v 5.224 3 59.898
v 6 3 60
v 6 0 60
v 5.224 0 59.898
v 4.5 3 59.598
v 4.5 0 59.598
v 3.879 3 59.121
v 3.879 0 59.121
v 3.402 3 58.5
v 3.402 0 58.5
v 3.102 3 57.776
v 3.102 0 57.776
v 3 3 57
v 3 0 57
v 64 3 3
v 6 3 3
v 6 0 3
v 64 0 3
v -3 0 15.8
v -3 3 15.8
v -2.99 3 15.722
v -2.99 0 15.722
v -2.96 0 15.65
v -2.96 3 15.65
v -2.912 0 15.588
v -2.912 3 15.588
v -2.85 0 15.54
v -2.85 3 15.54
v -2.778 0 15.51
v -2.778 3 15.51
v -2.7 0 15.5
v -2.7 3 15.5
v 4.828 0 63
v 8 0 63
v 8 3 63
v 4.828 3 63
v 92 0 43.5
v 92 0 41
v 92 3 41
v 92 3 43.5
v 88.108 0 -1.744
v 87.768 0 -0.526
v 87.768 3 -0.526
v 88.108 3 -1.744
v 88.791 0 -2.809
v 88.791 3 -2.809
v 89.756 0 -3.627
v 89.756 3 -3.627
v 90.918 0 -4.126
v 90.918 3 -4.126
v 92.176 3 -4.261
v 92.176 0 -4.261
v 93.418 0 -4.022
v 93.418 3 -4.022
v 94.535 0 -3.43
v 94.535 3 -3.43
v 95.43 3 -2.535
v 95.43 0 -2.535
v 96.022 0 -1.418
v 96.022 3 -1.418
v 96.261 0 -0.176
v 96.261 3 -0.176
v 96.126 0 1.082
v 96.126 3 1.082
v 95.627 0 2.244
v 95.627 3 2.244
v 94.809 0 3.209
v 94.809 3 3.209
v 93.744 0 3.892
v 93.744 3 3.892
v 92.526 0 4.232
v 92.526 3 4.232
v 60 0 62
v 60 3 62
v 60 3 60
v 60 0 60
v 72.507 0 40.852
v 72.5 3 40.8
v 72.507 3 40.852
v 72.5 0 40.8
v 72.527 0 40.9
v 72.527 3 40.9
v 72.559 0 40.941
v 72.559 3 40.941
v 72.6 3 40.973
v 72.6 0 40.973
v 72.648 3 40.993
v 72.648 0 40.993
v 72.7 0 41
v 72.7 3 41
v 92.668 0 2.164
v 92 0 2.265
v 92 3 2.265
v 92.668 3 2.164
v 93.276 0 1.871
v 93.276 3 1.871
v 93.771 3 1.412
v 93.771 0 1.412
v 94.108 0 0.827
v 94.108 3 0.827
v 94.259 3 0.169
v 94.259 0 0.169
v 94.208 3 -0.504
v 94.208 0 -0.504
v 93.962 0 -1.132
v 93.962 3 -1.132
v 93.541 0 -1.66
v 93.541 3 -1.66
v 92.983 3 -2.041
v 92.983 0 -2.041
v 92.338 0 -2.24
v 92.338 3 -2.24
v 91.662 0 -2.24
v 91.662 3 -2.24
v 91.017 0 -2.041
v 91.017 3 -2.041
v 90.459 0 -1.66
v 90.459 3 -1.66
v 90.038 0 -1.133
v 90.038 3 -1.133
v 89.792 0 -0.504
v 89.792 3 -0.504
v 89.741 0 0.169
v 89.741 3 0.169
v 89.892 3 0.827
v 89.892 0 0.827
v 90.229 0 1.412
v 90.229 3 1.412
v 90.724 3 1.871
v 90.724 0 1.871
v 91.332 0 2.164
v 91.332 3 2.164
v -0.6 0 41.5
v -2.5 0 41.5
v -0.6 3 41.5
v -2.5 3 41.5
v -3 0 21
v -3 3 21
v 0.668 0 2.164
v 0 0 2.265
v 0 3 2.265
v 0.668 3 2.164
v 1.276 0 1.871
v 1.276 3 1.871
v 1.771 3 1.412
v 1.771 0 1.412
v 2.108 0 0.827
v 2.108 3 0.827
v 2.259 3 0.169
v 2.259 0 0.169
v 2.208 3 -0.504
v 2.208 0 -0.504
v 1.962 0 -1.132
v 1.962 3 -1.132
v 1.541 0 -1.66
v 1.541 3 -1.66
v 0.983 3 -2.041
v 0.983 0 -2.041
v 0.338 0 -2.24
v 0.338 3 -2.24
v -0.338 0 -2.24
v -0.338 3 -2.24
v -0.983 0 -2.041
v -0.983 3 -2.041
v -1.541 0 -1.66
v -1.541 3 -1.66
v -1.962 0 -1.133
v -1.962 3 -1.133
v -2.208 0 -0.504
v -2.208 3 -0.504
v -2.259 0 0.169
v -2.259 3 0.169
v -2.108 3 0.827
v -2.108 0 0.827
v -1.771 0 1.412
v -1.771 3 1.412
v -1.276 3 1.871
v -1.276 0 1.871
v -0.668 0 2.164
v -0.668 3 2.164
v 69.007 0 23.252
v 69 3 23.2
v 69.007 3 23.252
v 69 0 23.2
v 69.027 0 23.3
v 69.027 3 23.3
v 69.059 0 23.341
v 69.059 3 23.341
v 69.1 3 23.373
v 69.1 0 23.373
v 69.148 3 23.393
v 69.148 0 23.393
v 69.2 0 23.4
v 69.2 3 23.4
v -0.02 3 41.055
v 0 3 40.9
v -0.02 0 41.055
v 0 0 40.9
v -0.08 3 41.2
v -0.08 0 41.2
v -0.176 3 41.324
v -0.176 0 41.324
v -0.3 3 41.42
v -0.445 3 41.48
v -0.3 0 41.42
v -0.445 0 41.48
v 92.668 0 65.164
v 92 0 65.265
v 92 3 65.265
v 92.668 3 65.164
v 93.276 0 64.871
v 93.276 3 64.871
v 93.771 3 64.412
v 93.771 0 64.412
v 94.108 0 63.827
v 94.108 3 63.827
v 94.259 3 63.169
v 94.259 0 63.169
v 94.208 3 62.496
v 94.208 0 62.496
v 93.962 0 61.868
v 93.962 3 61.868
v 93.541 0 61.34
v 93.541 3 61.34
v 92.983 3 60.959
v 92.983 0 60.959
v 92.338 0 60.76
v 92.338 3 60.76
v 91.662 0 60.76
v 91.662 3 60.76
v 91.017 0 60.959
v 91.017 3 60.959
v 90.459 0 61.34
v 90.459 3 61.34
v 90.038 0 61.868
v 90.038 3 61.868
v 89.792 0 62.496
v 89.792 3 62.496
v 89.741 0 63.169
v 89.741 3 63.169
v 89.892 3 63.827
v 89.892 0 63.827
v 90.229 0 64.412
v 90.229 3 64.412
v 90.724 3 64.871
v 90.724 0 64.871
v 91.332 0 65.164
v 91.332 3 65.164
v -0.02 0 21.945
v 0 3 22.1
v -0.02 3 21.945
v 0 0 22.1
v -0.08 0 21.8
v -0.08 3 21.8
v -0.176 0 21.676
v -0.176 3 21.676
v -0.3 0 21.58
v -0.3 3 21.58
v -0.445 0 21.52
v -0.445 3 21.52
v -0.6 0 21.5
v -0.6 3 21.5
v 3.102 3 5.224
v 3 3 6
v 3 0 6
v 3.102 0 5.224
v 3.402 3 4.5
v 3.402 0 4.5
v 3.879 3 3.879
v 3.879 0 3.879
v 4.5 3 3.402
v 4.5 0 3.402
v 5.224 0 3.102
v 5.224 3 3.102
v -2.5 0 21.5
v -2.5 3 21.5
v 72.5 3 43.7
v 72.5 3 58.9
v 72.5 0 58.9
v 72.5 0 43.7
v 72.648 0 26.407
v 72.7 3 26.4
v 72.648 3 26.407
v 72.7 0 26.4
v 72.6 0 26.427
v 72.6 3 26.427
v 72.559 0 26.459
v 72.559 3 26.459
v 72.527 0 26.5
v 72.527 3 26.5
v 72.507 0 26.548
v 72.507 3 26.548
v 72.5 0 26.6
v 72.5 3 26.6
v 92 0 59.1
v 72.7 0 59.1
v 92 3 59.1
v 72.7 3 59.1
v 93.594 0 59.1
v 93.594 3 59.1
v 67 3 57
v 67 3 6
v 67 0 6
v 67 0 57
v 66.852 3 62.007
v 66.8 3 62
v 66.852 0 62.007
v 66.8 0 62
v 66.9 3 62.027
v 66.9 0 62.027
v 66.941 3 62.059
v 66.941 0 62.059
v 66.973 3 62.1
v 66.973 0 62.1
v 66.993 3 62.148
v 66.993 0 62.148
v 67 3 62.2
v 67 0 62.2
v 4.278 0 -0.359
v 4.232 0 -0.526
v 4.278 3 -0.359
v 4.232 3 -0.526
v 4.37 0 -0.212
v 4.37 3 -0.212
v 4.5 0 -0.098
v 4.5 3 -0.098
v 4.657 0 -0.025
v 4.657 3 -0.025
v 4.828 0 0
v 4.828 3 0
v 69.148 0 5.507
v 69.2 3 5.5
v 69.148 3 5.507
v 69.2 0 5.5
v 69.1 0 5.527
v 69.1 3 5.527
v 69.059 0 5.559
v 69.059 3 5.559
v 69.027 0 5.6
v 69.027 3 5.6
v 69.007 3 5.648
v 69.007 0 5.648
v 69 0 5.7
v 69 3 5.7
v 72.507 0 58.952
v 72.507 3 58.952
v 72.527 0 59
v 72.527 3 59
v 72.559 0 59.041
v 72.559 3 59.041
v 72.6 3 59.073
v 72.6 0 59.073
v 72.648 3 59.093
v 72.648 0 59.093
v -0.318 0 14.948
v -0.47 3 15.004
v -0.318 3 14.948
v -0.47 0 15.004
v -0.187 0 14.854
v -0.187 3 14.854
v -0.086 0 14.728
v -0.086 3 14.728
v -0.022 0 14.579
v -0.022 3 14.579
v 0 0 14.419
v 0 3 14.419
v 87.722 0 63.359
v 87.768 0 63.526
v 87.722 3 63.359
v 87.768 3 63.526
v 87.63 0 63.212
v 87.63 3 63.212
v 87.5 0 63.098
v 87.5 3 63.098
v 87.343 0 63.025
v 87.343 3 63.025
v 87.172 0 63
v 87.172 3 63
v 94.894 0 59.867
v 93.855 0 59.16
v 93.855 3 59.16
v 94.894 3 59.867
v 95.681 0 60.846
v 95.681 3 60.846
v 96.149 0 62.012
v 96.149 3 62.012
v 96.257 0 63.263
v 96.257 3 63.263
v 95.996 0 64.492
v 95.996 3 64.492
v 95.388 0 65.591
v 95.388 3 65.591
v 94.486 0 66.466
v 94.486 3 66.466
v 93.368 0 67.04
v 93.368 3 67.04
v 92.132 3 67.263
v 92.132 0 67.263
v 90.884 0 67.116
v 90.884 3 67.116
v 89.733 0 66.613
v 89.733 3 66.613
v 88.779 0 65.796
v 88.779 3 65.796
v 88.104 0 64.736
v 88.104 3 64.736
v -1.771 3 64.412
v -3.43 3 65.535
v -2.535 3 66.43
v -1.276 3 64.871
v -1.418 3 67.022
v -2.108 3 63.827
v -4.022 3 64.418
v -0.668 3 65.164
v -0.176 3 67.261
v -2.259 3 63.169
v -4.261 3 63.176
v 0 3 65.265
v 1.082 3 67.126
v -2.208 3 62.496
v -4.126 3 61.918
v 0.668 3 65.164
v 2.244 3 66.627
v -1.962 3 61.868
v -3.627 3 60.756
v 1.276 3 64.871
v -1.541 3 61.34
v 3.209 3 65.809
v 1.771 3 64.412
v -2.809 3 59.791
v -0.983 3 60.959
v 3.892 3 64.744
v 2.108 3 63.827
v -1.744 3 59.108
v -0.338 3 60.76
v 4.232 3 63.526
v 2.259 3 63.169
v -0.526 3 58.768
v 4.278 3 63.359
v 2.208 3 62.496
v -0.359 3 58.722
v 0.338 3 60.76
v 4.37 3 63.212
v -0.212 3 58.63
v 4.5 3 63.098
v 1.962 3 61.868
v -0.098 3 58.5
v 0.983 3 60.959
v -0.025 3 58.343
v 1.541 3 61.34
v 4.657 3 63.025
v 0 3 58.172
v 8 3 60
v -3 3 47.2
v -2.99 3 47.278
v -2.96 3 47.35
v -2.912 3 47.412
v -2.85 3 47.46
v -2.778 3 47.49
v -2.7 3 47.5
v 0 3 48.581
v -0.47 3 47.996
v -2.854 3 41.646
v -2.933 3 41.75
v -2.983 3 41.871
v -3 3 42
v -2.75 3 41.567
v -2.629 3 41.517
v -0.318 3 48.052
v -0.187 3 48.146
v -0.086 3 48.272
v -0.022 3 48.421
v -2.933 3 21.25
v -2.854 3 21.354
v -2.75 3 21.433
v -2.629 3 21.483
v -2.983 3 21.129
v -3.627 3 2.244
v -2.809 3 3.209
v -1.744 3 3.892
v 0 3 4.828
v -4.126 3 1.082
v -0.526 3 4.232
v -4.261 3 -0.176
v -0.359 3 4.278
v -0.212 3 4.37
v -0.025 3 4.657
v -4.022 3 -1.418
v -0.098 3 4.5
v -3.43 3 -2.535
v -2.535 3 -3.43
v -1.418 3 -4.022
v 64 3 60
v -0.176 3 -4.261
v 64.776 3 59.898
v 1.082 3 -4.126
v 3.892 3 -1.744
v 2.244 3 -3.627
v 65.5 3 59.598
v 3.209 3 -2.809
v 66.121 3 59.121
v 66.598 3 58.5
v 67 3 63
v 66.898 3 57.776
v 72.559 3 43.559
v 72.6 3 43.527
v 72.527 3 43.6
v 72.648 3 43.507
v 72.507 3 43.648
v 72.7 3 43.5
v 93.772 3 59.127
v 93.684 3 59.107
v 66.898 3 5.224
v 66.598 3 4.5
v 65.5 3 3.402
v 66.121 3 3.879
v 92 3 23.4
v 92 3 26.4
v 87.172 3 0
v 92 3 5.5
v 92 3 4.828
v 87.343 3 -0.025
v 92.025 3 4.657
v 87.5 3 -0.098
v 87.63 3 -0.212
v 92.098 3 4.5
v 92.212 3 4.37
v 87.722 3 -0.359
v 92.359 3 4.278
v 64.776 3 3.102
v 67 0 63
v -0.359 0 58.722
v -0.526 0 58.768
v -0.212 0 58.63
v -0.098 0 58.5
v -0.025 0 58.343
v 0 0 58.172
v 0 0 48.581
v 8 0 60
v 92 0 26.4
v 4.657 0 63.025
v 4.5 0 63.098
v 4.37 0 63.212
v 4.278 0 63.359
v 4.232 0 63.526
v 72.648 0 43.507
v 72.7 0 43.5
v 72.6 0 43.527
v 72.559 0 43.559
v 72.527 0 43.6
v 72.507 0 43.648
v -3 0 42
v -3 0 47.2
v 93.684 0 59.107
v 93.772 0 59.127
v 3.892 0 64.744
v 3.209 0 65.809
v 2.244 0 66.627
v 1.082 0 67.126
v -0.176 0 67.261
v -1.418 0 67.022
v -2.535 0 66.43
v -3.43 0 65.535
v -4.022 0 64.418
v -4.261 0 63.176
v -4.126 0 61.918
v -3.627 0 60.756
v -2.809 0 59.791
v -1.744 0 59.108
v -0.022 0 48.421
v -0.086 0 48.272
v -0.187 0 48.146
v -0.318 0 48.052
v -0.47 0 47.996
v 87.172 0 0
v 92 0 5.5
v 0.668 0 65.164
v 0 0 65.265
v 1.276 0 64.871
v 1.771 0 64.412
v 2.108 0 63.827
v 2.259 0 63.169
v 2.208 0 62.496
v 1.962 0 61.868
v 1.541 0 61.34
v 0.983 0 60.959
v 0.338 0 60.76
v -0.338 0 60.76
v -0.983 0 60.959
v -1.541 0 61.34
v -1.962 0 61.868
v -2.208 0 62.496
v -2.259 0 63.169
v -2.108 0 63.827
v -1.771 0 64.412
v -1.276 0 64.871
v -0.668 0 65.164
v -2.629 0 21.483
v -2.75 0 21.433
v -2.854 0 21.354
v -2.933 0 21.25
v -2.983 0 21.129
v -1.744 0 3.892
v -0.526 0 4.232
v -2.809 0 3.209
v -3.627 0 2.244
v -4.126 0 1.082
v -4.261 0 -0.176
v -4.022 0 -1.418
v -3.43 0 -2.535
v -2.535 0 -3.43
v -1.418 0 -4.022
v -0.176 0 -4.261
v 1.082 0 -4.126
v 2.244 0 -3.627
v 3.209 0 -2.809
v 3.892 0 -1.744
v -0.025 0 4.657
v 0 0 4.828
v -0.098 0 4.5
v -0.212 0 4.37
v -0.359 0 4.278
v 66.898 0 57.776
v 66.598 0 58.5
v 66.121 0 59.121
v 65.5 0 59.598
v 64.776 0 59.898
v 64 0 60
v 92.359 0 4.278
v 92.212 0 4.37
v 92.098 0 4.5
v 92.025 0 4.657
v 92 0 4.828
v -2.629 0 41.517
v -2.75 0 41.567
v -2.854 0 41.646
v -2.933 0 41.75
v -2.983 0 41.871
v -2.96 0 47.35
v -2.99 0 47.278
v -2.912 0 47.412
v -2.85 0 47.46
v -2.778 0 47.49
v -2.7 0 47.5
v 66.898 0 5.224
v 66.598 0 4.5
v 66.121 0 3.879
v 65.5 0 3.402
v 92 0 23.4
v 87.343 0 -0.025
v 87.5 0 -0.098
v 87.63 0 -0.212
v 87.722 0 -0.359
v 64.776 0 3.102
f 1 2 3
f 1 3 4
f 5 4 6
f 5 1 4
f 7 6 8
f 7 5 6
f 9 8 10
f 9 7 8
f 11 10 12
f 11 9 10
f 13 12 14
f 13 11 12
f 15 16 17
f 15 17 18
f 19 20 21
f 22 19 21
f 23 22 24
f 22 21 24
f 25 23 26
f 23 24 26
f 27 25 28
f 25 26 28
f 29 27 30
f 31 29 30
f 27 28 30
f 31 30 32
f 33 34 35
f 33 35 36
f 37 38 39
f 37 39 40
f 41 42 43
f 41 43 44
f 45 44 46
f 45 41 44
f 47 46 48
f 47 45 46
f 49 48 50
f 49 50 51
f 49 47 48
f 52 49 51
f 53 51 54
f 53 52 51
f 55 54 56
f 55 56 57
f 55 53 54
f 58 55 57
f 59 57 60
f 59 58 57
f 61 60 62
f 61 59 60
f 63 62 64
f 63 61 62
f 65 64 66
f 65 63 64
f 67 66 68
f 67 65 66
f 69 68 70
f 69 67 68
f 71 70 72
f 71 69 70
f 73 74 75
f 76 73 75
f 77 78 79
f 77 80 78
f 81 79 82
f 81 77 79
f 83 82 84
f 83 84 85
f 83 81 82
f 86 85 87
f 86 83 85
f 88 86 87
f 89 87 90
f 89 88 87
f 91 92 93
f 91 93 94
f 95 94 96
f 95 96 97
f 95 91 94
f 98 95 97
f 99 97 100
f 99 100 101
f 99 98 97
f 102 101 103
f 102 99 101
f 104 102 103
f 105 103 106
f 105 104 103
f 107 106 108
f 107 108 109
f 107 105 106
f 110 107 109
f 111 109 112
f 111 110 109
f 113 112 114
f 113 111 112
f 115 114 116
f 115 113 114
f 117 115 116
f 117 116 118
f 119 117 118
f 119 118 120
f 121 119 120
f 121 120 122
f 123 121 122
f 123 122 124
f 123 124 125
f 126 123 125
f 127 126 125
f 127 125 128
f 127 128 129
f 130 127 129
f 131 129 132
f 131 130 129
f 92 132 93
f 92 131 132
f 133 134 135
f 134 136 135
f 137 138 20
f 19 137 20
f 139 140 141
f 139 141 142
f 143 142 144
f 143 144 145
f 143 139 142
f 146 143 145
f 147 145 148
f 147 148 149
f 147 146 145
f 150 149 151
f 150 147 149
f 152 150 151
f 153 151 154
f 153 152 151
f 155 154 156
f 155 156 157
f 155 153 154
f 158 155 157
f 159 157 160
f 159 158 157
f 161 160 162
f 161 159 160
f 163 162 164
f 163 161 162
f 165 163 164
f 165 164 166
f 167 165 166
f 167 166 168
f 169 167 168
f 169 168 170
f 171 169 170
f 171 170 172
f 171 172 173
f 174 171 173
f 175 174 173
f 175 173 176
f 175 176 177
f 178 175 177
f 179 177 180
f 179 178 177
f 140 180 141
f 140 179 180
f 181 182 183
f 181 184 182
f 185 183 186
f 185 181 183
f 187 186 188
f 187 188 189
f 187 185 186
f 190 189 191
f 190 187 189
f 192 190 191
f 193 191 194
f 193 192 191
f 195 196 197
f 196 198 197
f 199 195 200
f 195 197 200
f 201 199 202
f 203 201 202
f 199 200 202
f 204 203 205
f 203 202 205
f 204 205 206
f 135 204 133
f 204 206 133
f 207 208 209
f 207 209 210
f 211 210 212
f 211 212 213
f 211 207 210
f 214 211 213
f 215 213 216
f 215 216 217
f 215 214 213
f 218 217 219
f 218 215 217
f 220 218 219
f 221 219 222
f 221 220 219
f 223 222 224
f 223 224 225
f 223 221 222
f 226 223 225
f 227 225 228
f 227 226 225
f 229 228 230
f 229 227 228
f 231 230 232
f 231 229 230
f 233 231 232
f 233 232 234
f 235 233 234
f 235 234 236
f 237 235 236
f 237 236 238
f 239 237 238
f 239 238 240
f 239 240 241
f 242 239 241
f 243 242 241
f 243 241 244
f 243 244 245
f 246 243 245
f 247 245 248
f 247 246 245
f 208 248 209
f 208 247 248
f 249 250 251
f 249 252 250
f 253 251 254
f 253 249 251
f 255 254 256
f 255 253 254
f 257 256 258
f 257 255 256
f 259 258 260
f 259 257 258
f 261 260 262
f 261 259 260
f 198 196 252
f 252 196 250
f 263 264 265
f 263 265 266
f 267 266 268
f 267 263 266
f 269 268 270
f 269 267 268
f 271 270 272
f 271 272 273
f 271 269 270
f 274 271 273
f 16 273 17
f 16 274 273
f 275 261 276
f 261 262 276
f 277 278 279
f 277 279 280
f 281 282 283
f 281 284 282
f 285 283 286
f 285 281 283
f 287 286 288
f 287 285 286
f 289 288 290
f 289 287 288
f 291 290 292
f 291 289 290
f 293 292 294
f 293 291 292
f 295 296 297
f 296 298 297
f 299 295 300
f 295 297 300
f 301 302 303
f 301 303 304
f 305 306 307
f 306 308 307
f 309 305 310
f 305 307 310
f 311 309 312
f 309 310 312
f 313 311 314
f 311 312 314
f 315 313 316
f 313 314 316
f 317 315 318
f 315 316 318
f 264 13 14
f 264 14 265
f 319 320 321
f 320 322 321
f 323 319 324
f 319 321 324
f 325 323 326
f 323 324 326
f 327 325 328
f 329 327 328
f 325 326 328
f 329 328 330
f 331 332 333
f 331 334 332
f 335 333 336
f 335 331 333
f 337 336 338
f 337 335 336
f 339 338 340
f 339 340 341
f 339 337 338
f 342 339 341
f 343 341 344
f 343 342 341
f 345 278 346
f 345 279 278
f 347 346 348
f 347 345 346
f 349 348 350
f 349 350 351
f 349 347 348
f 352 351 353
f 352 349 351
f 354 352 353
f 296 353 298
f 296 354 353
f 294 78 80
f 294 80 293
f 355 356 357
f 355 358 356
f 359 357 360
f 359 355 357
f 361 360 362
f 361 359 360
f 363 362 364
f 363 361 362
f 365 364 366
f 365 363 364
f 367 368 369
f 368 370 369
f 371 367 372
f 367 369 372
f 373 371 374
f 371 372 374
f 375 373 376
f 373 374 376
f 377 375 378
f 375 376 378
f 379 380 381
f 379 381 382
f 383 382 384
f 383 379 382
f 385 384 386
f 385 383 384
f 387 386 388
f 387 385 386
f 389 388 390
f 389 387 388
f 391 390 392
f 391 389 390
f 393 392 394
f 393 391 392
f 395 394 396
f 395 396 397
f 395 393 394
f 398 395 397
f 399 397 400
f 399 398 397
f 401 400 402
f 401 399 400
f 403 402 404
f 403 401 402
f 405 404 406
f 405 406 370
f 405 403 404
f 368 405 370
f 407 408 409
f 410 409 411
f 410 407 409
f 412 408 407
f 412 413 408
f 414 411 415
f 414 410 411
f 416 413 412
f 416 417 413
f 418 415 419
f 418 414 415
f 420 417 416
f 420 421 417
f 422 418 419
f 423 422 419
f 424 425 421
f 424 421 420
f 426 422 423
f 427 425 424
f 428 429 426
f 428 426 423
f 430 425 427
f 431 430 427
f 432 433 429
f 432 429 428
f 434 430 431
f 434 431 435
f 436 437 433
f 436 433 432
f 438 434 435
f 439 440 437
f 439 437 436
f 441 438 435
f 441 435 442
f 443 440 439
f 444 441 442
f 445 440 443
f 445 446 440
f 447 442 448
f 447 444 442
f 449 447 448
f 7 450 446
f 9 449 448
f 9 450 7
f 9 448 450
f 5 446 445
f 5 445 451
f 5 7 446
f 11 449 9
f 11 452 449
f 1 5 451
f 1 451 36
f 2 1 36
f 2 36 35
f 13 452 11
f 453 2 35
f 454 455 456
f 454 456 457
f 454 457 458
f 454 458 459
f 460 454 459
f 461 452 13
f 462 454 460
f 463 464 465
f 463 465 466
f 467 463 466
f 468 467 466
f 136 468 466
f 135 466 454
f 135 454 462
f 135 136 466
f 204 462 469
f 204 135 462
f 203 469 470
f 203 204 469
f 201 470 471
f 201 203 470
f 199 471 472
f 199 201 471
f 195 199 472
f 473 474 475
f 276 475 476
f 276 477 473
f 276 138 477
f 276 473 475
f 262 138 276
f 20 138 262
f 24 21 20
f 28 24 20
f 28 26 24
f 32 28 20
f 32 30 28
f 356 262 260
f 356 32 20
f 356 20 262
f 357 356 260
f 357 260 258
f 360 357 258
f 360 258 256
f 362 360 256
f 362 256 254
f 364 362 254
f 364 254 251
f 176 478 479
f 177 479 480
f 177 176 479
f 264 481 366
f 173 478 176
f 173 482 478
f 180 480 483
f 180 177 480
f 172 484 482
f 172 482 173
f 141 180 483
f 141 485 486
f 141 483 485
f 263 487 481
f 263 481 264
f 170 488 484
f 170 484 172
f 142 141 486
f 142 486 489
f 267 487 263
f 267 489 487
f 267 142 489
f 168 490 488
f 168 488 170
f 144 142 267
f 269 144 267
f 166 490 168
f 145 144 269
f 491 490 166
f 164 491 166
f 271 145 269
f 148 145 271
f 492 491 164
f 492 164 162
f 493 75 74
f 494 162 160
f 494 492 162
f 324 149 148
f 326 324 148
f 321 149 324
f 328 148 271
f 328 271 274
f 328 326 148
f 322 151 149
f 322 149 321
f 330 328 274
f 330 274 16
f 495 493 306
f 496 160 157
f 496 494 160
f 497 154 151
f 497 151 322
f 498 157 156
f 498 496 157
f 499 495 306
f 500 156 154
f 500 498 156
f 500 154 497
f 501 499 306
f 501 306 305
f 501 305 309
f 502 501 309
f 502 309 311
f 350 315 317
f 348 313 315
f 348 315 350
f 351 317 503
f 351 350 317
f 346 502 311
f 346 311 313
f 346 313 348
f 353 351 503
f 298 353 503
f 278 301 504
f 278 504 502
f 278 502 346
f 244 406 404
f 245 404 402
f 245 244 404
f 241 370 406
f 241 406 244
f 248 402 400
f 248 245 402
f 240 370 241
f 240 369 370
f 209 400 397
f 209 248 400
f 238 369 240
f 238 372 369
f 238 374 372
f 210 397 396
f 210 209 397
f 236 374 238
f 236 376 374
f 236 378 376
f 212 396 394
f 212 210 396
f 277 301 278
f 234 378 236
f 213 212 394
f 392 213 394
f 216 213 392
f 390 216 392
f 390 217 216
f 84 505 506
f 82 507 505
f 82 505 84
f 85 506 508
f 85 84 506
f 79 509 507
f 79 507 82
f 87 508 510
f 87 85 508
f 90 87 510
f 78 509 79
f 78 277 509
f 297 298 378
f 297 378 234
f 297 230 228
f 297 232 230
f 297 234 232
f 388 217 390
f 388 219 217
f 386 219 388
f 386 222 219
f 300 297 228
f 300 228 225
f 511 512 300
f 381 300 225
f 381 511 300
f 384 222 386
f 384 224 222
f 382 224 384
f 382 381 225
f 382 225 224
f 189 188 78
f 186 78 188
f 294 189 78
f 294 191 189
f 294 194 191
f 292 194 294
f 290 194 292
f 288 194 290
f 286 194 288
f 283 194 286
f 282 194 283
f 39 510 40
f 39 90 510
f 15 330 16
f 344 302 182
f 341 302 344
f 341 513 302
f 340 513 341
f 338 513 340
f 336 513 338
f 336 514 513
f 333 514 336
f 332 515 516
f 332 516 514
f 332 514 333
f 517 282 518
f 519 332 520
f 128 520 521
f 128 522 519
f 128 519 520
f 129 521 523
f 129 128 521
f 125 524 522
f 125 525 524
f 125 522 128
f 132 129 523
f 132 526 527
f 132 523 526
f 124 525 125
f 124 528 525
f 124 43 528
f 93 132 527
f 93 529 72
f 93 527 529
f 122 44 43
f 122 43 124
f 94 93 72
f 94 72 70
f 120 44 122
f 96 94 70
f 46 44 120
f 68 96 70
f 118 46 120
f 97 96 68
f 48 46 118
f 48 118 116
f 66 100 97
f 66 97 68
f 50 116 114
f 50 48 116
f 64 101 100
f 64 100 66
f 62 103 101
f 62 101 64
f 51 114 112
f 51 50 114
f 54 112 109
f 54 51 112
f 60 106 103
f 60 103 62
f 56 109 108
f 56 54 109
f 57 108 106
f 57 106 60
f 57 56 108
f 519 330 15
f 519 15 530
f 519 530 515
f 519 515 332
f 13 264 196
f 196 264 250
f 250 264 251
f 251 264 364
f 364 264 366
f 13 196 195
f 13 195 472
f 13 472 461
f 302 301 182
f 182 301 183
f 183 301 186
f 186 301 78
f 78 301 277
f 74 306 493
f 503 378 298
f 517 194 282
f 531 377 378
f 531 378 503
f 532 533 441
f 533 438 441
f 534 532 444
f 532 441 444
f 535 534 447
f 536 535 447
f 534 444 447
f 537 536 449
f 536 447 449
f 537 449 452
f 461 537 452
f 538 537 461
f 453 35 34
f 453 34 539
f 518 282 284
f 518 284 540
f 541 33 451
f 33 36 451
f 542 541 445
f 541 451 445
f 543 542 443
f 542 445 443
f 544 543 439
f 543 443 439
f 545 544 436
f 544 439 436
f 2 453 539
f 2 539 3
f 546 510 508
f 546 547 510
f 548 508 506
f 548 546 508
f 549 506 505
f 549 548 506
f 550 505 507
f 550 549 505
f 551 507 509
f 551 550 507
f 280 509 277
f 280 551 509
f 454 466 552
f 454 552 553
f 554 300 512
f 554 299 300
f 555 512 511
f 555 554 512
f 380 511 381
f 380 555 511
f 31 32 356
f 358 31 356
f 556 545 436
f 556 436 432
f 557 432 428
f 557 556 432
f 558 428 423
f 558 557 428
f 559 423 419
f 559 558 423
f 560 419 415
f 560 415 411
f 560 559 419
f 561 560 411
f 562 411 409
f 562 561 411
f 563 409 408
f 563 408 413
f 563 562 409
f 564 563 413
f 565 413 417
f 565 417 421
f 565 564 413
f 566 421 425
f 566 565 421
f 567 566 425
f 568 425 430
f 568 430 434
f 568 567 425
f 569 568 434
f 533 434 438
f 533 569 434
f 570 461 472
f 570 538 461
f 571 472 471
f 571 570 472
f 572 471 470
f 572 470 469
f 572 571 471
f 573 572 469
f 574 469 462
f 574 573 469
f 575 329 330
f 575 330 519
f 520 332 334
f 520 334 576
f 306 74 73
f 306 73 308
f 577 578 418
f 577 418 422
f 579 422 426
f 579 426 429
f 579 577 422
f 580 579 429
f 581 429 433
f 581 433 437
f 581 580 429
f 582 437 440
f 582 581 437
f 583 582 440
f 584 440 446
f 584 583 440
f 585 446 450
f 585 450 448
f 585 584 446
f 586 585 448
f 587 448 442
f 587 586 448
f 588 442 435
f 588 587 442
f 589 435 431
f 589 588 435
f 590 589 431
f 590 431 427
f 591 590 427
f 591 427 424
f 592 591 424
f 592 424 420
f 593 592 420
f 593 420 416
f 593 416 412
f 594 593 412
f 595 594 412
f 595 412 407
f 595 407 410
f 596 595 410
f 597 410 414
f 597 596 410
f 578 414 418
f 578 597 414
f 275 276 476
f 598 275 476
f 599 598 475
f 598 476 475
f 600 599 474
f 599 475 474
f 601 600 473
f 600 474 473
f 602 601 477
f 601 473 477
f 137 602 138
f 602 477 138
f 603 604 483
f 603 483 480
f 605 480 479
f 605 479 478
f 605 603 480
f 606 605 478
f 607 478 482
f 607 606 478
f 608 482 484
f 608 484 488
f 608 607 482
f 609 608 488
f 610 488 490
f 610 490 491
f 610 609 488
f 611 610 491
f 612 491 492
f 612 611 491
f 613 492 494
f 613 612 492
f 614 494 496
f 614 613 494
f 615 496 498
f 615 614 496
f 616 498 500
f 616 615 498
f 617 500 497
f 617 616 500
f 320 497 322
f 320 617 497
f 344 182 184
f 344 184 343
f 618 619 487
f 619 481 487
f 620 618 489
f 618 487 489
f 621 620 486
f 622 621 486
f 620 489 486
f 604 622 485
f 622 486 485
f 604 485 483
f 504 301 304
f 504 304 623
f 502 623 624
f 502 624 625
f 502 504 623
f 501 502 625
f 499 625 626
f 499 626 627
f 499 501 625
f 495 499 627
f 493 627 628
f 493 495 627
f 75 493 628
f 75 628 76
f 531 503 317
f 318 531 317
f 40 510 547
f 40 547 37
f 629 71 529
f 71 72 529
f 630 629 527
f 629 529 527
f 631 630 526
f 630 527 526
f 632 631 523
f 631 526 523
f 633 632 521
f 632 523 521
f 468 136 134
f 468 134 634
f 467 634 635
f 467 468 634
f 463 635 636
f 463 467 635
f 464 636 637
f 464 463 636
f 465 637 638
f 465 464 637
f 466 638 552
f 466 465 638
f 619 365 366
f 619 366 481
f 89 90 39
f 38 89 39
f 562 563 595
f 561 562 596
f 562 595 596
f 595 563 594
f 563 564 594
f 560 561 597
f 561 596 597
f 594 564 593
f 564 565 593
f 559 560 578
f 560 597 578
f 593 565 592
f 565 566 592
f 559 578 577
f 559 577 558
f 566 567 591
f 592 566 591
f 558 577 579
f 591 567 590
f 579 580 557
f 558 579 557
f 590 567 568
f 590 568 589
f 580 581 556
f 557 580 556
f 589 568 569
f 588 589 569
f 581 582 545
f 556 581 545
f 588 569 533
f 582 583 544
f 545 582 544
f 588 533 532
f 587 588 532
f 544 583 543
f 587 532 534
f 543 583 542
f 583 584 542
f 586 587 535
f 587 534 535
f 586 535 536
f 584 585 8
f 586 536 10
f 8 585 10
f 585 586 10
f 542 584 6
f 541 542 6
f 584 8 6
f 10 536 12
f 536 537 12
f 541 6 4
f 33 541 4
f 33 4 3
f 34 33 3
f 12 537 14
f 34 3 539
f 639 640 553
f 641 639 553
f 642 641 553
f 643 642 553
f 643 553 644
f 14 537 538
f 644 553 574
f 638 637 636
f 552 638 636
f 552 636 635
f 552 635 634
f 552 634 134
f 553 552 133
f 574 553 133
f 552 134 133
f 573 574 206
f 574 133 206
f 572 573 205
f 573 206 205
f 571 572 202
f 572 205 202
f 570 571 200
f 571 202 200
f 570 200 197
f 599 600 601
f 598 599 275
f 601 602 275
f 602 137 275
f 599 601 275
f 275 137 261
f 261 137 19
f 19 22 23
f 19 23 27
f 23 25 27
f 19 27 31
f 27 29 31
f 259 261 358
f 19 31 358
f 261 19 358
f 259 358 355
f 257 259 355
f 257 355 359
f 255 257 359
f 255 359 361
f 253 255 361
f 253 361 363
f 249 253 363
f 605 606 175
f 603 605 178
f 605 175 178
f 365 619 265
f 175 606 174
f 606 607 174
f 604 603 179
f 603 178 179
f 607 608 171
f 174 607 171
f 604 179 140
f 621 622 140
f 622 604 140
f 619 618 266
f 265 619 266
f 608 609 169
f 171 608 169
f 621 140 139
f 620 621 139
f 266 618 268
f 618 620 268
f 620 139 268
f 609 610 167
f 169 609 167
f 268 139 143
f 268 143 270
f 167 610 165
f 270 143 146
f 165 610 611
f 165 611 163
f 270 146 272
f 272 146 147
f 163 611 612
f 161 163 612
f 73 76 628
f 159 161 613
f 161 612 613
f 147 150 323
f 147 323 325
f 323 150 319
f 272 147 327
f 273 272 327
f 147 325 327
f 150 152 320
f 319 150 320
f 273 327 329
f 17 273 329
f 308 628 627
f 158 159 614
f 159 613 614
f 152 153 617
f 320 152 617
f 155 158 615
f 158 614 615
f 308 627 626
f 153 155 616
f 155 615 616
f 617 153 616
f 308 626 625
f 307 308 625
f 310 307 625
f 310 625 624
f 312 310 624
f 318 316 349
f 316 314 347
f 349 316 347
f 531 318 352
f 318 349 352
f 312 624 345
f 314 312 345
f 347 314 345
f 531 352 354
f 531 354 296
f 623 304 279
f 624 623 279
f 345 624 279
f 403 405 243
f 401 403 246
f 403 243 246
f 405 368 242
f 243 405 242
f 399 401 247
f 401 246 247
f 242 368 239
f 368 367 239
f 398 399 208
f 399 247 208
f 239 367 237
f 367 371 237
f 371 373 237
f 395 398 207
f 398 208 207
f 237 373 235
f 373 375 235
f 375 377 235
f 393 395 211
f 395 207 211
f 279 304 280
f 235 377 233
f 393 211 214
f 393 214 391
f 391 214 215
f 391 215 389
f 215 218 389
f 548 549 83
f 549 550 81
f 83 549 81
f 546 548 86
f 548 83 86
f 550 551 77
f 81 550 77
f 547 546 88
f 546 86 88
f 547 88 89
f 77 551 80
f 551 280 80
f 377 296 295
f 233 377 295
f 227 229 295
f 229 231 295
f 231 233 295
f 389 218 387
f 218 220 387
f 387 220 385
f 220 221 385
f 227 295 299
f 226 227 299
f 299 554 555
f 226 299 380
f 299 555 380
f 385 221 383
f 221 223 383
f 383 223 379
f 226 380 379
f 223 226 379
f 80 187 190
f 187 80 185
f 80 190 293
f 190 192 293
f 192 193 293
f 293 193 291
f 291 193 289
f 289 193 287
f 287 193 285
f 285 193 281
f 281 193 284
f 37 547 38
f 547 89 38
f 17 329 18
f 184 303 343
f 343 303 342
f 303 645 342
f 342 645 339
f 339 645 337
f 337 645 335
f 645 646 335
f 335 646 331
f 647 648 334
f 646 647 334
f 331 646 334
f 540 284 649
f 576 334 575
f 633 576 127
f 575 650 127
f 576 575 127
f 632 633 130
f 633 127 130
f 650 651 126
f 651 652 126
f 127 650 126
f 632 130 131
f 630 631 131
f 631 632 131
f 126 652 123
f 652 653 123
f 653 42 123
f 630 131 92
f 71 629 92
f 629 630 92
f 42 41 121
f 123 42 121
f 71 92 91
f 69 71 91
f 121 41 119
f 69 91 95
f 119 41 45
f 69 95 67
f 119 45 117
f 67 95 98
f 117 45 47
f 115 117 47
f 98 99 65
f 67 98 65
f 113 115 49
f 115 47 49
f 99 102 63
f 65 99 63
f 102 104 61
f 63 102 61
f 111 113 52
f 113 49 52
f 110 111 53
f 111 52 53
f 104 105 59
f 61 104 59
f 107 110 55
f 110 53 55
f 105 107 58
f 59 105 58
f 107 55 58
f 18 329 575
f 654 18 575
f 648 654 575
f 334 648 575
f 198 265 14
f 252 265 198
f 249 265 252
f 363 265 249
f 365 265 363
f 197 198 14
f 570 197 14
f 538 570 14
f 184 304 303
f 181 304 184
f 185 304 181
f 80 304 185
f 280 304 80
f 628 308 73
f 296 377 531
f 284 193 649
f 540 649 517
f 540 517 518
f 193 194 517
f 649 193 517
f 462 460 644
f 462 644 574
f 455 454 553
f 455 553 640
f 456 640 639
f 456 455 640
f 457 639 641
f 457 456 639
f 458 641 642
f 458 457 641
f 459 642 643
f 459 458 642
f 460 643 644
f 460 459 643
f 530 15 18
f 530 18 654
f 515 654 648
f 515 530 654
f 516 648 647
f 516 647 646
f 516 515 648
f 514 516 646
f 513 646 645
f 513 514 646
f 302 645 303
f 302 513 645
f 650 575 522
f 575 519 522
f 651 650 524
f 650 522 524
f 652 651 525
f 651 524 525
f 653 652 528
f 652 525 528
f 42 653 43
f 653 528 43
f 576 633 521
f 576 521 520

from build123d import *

# Parameters (mm, degrees)
SKETCH1_R           = 2.265
BOSS_EXTRUDE1_DEPTH = 3
SKETCH2_W           = 6.5
SKETCH2_H           = 20
CUT_EXTRUDE1_DEPTH  = 3
BOSS_EXTRUDE2_DEPTH = 3
CUT_EXTRUDE2_DEPTH  = 3
SKETCH5_W           = 3
SKETCH5_H           = 20
BOSS_EXTRUDE3_DEPTH = 3
SKETCH6_W           = 27.010134686
SKETCH6_H           = 17.9
CUT_EXTRUDE3_DEPTH  = 3
SKETCH7_W           = 19.5
SKETCH7_H           = 14.6
CUT_EXTRUDE4_DEPTH  = 3
SKETCH8_W           = 19.5
SKETCH8_H           = 15.6
CUT_EXTRUDE5_DEPTH  = 3
SKETCH9_W           = 2.019620965
SKETCH9_H           = 0.574286347
CUT_EXTRUDE6_DEPTH  = 3
SKETCH10_W          = 52
SKETCH10_H          = 3
CUT_EXTRUDE7_DEPTH  = 3
SKETCH11_W          = 7
SKETCH11_H          = 1
CUT_EXTRUDE8_DEPTH  = 3
FILLET1_R           = 0.6
FILLET2_R           = 0.2


with BuildPart() as part:
    # Sketch1 → Boss-Extrude1 (new body)
    with BuildSketch(Plane(origin=(0, 0, 0), x_dir=(1, 0, 0), z_dir=(0, 1, 0))):
        with BuildLine():
            Line((4.265, 0), (87.735, 0))
            ThreePointArc((87.735, 0), (95.015810422, 3.015810422), (92, -4.265))
            Line((92, -4.265), (92, -58.735))
            ThreePointArc((92, -58.735), (95.015810422, -66.015810422), (87.735, -63))
            Line((87.735, -63), (4.265, -63))
            ThreePointArc((4.265, -63), (-3.015810422, -66.015810422), (0, -58.735))
            Line((0, -58.735), (0, -4.265))
            ThreePointArc((0, -4.265), (-3.015810422, 3.015810422), (4.265, 0))
        make_face()
        with Locations(Location((0, 0, 0), (0, 0, 270))):
            Circle(SKETCH1_R, mode=Mode.SUBTRACT)
        with Locations(Location((92, 0, 0), (0, 0, 270))):
            Circle(SKETCH1_R, mode=Mode.SUBTRACT)
        with Locations(Location((92, -63, 0), (0, 0, 270))):
            Circle(SKETCH1_R, mode=Mode.SUBTRACT)
        with Locations(Location((0, -63, 0), (0, 0, 270))):
            Circle(SKETCH1_R, mode=Mode.SUBTRACT)
    extrude(amount=BOSS_EXTRUDE1_DEPTH)

    # Sketch2 → Cut-Extrude1 (cut)
    with BuildSketch(Plane(origin=(0, 3, 0), x_dir=(1, 0, 0), z_dir=(0, 1, 0))):
        with Locations((3.25, -31.5)):
            Rectangle(SKETCH2_W, SKETCH2_H)
    extrude(amount=-CUT_EXTRUDE1_DEPTH, mode=Mode.SUBTRACT)

    # Sketch3 → Boss-Extrude2 (add)
    with BuildSketch(Plane(origin=(0, 3, 0), x_dir=(1, 0, 0), z_dir=(0, 1, 0))):
        with BuildLine():
            Line((-2.7, -15.5), (0, -14.9))
            Line((0, -14.9), (0, -21.5))
            Line((0, -21.5), (-2.5, -21.5))
            ThreePointArc((-2.5, -21.5), (-2.853553391, -21.353553391), (-3, -21))
            Line((-3, -21), (-3, -15.8))
            ThreePointArc((-3, -15.8), (-2.912132034, -15.587867966), (-2.7, -15.5))
        make_face()
        with BuildLine():
            Line((-3, -42), (-3, -47.2))
            ThreePointArc((-3, -47.2), (-2.912132034, -47.412132034), (-2.7, -47.5))
            Line((-2.7, -47.5), (0, -48.1))
            Line((0, -48.1), (0, -41.5))
            Line((0, -41.5), (-2.5, -41.5))
            ThreePointArc((-2.5, -41.5), (-2.853553391, -41.646446609), (-3, -42))
        make_face()
    extrude(amount=-BOSS_EXTRUDE2_DEPTH)

    # Sketch4 → Cut-Extrude2 (cut)
    with BuildSketch(Plane(origin=(0, 3, 0), x_dir=(1, 0, 0), z_dir=(0, 1, 0))):
        with BuildLine():
            Line((6, -3), (64, -3))
            ThreePointArc((64, -3), (66.121320344, -3.878679656), (67, -6))
            Line((67, -6), (67, -57))
            ThreePointArc((67, -57), (66.121320344, -59.121320344), (64, -60))
            Line((64, -60), (6, -60))
            ThreePointArc((6, -60), (3.878679656, -59.121320344), (3, -57))
            Line((3, -57), (3, -6))
            ThreePointArc((3, -6), (3.878679656, -3.878679656), (6, -3))
        make_face()
    extrude(amount=-CUT_EXTRUDE2_DEPTH, mode=Mode.SUBTRACT)

    # Sketch5 → Boss-Extrude3 (add)
    with BuildSketch(Plane(origin=(0, 3, 0), x_dir=(1, 0, 0), z_dir=(0, 1, 0))):
        with Locations((1.5, -31.5)):
            Rectangle(SKETCH5_W, SKETCH5_H)
    extrude(amount=-BOSS_EXTRUDE3_DEPTH)

    # Sketch6 → Cut-Extrude3 (cut)
    with BuildSketch(Plane(origin=(0, 3, 0), x_dir=(1, 0, 0), z_dir=(0, 1, 0))):
        with Locations((82.505067343, -14.45)):
            Rectangle(SKETCH6_W, SKETCH6_H)
    extrude(amount=-CUT_EXTRUDE3_DEPTH, mode=Mode.SUBTRACT)

    # Sketch7 → Cut-Extrude4 (cut)
    with BuildSketch(Plane(origin=(0, 3, 0), x_dir=(1, 0, 0), z_dir=(0, 1, 0))):
        with Locations((82.25, -33.7)):
            Rectangle(SKETCH7_W, SKETCH7_H)
    extrude(amount=-CUT_EXTRUDE4_DEPTH, mode=Mode.SUBTRACT)

    # Sketch8 → Cut-Extrude5 (cut)
    with BuildSketch(Plane(origin=(0, 3, 0), x_dir=(1, 0, 0), z_dir=(0, 1, 0))):
        with Locations((82.25, -51.3)):
            Rectangle(SKETCH8_W, SKETCH8_H)
    extrude(amount=-CUT_EXTRUDE5_DEPTH, mode=Mode.SUBTRACT)

    # Sketch9 → Cut-Extrude6 (cut)
    with BuildSketch(Plane(origin=(0, 3, 0), x_dir=(1, 0, 0), z_dir=(0, 1, 0))):
        with Locations((93.009810483, -58.812856827)):
            Rectangle(SKETCH9_W, SKETCH9_H)
    extrude(amount=-CUT_EXTRUDE6_DEPTH, mode=Mode.SUBTRACT)

    # Sketch10 → Cut-Extrude7 (cut)
    with BuildSketch(Plane(origin=(0, 3, 0), x_dir=(1, 0, 0), z_dir=(0, 1, 0))):
        with Locations((34, -61.5)):
            Rectangle(SKETCH10_W, SKETCH10_H)
    extrude(amount=-CUT_EXTRUDE7_DEPTH, mode=Mode.SUBTRACT)

    # Sketch11 → Cut-Extrude8 (cut)
    with BuildSketch(Plane(origin=(0, 3, 0), x_dir=(1, 0, 0), z_dir=(0, 1, 0))):
        with Locations((63.5, -62.5)):
            Rectangle(SKETCH11_W, SKETCH11_H)
    extrude(amount=-CUT_EXTRUDE8_DEPTH, mode=Mode.SUBTRACT)

    # Fillet1
    fillet1_edges = [part.edges().sort_by_distance(p)[0] for p in [
        (0, 1.5, 41.5),
        (92, 1.5, 4.265),
        (0, 1.5, 21.5),
        (87.735, 1.5, 63),
        (4.265, 1.5, 63),
        (0, 1.5, 58.735),
        (0, 1.5, 4.265),
        (4.265, 1.5, 0),
        (87.735, 1.5, 0),
        (93.726332818, 1.5, 59.1),
        (0, 1.5, 14.9),
        (0, 1.5, 48.1),
    ]]
    fillet(fillet1_edges, radius=FILLET1_R)

    # Fillet2
    fillet2_edges = [part.edges().sort_by_distance(p)[0] for p in [
        (69, 1.5, 5.5),
        (69, 1.5, 23.4),
        (72.5, 1.5, 41),
        (72.5, 1.5, 26.4),
        (72.5, 1.5, 59.1),
        (72.5, 1.5, 43.5),
        (67, 1.5, 62),
    ]]
    fillet(fillet2_edges, radius=FILLET2_R)


solid = part.part
